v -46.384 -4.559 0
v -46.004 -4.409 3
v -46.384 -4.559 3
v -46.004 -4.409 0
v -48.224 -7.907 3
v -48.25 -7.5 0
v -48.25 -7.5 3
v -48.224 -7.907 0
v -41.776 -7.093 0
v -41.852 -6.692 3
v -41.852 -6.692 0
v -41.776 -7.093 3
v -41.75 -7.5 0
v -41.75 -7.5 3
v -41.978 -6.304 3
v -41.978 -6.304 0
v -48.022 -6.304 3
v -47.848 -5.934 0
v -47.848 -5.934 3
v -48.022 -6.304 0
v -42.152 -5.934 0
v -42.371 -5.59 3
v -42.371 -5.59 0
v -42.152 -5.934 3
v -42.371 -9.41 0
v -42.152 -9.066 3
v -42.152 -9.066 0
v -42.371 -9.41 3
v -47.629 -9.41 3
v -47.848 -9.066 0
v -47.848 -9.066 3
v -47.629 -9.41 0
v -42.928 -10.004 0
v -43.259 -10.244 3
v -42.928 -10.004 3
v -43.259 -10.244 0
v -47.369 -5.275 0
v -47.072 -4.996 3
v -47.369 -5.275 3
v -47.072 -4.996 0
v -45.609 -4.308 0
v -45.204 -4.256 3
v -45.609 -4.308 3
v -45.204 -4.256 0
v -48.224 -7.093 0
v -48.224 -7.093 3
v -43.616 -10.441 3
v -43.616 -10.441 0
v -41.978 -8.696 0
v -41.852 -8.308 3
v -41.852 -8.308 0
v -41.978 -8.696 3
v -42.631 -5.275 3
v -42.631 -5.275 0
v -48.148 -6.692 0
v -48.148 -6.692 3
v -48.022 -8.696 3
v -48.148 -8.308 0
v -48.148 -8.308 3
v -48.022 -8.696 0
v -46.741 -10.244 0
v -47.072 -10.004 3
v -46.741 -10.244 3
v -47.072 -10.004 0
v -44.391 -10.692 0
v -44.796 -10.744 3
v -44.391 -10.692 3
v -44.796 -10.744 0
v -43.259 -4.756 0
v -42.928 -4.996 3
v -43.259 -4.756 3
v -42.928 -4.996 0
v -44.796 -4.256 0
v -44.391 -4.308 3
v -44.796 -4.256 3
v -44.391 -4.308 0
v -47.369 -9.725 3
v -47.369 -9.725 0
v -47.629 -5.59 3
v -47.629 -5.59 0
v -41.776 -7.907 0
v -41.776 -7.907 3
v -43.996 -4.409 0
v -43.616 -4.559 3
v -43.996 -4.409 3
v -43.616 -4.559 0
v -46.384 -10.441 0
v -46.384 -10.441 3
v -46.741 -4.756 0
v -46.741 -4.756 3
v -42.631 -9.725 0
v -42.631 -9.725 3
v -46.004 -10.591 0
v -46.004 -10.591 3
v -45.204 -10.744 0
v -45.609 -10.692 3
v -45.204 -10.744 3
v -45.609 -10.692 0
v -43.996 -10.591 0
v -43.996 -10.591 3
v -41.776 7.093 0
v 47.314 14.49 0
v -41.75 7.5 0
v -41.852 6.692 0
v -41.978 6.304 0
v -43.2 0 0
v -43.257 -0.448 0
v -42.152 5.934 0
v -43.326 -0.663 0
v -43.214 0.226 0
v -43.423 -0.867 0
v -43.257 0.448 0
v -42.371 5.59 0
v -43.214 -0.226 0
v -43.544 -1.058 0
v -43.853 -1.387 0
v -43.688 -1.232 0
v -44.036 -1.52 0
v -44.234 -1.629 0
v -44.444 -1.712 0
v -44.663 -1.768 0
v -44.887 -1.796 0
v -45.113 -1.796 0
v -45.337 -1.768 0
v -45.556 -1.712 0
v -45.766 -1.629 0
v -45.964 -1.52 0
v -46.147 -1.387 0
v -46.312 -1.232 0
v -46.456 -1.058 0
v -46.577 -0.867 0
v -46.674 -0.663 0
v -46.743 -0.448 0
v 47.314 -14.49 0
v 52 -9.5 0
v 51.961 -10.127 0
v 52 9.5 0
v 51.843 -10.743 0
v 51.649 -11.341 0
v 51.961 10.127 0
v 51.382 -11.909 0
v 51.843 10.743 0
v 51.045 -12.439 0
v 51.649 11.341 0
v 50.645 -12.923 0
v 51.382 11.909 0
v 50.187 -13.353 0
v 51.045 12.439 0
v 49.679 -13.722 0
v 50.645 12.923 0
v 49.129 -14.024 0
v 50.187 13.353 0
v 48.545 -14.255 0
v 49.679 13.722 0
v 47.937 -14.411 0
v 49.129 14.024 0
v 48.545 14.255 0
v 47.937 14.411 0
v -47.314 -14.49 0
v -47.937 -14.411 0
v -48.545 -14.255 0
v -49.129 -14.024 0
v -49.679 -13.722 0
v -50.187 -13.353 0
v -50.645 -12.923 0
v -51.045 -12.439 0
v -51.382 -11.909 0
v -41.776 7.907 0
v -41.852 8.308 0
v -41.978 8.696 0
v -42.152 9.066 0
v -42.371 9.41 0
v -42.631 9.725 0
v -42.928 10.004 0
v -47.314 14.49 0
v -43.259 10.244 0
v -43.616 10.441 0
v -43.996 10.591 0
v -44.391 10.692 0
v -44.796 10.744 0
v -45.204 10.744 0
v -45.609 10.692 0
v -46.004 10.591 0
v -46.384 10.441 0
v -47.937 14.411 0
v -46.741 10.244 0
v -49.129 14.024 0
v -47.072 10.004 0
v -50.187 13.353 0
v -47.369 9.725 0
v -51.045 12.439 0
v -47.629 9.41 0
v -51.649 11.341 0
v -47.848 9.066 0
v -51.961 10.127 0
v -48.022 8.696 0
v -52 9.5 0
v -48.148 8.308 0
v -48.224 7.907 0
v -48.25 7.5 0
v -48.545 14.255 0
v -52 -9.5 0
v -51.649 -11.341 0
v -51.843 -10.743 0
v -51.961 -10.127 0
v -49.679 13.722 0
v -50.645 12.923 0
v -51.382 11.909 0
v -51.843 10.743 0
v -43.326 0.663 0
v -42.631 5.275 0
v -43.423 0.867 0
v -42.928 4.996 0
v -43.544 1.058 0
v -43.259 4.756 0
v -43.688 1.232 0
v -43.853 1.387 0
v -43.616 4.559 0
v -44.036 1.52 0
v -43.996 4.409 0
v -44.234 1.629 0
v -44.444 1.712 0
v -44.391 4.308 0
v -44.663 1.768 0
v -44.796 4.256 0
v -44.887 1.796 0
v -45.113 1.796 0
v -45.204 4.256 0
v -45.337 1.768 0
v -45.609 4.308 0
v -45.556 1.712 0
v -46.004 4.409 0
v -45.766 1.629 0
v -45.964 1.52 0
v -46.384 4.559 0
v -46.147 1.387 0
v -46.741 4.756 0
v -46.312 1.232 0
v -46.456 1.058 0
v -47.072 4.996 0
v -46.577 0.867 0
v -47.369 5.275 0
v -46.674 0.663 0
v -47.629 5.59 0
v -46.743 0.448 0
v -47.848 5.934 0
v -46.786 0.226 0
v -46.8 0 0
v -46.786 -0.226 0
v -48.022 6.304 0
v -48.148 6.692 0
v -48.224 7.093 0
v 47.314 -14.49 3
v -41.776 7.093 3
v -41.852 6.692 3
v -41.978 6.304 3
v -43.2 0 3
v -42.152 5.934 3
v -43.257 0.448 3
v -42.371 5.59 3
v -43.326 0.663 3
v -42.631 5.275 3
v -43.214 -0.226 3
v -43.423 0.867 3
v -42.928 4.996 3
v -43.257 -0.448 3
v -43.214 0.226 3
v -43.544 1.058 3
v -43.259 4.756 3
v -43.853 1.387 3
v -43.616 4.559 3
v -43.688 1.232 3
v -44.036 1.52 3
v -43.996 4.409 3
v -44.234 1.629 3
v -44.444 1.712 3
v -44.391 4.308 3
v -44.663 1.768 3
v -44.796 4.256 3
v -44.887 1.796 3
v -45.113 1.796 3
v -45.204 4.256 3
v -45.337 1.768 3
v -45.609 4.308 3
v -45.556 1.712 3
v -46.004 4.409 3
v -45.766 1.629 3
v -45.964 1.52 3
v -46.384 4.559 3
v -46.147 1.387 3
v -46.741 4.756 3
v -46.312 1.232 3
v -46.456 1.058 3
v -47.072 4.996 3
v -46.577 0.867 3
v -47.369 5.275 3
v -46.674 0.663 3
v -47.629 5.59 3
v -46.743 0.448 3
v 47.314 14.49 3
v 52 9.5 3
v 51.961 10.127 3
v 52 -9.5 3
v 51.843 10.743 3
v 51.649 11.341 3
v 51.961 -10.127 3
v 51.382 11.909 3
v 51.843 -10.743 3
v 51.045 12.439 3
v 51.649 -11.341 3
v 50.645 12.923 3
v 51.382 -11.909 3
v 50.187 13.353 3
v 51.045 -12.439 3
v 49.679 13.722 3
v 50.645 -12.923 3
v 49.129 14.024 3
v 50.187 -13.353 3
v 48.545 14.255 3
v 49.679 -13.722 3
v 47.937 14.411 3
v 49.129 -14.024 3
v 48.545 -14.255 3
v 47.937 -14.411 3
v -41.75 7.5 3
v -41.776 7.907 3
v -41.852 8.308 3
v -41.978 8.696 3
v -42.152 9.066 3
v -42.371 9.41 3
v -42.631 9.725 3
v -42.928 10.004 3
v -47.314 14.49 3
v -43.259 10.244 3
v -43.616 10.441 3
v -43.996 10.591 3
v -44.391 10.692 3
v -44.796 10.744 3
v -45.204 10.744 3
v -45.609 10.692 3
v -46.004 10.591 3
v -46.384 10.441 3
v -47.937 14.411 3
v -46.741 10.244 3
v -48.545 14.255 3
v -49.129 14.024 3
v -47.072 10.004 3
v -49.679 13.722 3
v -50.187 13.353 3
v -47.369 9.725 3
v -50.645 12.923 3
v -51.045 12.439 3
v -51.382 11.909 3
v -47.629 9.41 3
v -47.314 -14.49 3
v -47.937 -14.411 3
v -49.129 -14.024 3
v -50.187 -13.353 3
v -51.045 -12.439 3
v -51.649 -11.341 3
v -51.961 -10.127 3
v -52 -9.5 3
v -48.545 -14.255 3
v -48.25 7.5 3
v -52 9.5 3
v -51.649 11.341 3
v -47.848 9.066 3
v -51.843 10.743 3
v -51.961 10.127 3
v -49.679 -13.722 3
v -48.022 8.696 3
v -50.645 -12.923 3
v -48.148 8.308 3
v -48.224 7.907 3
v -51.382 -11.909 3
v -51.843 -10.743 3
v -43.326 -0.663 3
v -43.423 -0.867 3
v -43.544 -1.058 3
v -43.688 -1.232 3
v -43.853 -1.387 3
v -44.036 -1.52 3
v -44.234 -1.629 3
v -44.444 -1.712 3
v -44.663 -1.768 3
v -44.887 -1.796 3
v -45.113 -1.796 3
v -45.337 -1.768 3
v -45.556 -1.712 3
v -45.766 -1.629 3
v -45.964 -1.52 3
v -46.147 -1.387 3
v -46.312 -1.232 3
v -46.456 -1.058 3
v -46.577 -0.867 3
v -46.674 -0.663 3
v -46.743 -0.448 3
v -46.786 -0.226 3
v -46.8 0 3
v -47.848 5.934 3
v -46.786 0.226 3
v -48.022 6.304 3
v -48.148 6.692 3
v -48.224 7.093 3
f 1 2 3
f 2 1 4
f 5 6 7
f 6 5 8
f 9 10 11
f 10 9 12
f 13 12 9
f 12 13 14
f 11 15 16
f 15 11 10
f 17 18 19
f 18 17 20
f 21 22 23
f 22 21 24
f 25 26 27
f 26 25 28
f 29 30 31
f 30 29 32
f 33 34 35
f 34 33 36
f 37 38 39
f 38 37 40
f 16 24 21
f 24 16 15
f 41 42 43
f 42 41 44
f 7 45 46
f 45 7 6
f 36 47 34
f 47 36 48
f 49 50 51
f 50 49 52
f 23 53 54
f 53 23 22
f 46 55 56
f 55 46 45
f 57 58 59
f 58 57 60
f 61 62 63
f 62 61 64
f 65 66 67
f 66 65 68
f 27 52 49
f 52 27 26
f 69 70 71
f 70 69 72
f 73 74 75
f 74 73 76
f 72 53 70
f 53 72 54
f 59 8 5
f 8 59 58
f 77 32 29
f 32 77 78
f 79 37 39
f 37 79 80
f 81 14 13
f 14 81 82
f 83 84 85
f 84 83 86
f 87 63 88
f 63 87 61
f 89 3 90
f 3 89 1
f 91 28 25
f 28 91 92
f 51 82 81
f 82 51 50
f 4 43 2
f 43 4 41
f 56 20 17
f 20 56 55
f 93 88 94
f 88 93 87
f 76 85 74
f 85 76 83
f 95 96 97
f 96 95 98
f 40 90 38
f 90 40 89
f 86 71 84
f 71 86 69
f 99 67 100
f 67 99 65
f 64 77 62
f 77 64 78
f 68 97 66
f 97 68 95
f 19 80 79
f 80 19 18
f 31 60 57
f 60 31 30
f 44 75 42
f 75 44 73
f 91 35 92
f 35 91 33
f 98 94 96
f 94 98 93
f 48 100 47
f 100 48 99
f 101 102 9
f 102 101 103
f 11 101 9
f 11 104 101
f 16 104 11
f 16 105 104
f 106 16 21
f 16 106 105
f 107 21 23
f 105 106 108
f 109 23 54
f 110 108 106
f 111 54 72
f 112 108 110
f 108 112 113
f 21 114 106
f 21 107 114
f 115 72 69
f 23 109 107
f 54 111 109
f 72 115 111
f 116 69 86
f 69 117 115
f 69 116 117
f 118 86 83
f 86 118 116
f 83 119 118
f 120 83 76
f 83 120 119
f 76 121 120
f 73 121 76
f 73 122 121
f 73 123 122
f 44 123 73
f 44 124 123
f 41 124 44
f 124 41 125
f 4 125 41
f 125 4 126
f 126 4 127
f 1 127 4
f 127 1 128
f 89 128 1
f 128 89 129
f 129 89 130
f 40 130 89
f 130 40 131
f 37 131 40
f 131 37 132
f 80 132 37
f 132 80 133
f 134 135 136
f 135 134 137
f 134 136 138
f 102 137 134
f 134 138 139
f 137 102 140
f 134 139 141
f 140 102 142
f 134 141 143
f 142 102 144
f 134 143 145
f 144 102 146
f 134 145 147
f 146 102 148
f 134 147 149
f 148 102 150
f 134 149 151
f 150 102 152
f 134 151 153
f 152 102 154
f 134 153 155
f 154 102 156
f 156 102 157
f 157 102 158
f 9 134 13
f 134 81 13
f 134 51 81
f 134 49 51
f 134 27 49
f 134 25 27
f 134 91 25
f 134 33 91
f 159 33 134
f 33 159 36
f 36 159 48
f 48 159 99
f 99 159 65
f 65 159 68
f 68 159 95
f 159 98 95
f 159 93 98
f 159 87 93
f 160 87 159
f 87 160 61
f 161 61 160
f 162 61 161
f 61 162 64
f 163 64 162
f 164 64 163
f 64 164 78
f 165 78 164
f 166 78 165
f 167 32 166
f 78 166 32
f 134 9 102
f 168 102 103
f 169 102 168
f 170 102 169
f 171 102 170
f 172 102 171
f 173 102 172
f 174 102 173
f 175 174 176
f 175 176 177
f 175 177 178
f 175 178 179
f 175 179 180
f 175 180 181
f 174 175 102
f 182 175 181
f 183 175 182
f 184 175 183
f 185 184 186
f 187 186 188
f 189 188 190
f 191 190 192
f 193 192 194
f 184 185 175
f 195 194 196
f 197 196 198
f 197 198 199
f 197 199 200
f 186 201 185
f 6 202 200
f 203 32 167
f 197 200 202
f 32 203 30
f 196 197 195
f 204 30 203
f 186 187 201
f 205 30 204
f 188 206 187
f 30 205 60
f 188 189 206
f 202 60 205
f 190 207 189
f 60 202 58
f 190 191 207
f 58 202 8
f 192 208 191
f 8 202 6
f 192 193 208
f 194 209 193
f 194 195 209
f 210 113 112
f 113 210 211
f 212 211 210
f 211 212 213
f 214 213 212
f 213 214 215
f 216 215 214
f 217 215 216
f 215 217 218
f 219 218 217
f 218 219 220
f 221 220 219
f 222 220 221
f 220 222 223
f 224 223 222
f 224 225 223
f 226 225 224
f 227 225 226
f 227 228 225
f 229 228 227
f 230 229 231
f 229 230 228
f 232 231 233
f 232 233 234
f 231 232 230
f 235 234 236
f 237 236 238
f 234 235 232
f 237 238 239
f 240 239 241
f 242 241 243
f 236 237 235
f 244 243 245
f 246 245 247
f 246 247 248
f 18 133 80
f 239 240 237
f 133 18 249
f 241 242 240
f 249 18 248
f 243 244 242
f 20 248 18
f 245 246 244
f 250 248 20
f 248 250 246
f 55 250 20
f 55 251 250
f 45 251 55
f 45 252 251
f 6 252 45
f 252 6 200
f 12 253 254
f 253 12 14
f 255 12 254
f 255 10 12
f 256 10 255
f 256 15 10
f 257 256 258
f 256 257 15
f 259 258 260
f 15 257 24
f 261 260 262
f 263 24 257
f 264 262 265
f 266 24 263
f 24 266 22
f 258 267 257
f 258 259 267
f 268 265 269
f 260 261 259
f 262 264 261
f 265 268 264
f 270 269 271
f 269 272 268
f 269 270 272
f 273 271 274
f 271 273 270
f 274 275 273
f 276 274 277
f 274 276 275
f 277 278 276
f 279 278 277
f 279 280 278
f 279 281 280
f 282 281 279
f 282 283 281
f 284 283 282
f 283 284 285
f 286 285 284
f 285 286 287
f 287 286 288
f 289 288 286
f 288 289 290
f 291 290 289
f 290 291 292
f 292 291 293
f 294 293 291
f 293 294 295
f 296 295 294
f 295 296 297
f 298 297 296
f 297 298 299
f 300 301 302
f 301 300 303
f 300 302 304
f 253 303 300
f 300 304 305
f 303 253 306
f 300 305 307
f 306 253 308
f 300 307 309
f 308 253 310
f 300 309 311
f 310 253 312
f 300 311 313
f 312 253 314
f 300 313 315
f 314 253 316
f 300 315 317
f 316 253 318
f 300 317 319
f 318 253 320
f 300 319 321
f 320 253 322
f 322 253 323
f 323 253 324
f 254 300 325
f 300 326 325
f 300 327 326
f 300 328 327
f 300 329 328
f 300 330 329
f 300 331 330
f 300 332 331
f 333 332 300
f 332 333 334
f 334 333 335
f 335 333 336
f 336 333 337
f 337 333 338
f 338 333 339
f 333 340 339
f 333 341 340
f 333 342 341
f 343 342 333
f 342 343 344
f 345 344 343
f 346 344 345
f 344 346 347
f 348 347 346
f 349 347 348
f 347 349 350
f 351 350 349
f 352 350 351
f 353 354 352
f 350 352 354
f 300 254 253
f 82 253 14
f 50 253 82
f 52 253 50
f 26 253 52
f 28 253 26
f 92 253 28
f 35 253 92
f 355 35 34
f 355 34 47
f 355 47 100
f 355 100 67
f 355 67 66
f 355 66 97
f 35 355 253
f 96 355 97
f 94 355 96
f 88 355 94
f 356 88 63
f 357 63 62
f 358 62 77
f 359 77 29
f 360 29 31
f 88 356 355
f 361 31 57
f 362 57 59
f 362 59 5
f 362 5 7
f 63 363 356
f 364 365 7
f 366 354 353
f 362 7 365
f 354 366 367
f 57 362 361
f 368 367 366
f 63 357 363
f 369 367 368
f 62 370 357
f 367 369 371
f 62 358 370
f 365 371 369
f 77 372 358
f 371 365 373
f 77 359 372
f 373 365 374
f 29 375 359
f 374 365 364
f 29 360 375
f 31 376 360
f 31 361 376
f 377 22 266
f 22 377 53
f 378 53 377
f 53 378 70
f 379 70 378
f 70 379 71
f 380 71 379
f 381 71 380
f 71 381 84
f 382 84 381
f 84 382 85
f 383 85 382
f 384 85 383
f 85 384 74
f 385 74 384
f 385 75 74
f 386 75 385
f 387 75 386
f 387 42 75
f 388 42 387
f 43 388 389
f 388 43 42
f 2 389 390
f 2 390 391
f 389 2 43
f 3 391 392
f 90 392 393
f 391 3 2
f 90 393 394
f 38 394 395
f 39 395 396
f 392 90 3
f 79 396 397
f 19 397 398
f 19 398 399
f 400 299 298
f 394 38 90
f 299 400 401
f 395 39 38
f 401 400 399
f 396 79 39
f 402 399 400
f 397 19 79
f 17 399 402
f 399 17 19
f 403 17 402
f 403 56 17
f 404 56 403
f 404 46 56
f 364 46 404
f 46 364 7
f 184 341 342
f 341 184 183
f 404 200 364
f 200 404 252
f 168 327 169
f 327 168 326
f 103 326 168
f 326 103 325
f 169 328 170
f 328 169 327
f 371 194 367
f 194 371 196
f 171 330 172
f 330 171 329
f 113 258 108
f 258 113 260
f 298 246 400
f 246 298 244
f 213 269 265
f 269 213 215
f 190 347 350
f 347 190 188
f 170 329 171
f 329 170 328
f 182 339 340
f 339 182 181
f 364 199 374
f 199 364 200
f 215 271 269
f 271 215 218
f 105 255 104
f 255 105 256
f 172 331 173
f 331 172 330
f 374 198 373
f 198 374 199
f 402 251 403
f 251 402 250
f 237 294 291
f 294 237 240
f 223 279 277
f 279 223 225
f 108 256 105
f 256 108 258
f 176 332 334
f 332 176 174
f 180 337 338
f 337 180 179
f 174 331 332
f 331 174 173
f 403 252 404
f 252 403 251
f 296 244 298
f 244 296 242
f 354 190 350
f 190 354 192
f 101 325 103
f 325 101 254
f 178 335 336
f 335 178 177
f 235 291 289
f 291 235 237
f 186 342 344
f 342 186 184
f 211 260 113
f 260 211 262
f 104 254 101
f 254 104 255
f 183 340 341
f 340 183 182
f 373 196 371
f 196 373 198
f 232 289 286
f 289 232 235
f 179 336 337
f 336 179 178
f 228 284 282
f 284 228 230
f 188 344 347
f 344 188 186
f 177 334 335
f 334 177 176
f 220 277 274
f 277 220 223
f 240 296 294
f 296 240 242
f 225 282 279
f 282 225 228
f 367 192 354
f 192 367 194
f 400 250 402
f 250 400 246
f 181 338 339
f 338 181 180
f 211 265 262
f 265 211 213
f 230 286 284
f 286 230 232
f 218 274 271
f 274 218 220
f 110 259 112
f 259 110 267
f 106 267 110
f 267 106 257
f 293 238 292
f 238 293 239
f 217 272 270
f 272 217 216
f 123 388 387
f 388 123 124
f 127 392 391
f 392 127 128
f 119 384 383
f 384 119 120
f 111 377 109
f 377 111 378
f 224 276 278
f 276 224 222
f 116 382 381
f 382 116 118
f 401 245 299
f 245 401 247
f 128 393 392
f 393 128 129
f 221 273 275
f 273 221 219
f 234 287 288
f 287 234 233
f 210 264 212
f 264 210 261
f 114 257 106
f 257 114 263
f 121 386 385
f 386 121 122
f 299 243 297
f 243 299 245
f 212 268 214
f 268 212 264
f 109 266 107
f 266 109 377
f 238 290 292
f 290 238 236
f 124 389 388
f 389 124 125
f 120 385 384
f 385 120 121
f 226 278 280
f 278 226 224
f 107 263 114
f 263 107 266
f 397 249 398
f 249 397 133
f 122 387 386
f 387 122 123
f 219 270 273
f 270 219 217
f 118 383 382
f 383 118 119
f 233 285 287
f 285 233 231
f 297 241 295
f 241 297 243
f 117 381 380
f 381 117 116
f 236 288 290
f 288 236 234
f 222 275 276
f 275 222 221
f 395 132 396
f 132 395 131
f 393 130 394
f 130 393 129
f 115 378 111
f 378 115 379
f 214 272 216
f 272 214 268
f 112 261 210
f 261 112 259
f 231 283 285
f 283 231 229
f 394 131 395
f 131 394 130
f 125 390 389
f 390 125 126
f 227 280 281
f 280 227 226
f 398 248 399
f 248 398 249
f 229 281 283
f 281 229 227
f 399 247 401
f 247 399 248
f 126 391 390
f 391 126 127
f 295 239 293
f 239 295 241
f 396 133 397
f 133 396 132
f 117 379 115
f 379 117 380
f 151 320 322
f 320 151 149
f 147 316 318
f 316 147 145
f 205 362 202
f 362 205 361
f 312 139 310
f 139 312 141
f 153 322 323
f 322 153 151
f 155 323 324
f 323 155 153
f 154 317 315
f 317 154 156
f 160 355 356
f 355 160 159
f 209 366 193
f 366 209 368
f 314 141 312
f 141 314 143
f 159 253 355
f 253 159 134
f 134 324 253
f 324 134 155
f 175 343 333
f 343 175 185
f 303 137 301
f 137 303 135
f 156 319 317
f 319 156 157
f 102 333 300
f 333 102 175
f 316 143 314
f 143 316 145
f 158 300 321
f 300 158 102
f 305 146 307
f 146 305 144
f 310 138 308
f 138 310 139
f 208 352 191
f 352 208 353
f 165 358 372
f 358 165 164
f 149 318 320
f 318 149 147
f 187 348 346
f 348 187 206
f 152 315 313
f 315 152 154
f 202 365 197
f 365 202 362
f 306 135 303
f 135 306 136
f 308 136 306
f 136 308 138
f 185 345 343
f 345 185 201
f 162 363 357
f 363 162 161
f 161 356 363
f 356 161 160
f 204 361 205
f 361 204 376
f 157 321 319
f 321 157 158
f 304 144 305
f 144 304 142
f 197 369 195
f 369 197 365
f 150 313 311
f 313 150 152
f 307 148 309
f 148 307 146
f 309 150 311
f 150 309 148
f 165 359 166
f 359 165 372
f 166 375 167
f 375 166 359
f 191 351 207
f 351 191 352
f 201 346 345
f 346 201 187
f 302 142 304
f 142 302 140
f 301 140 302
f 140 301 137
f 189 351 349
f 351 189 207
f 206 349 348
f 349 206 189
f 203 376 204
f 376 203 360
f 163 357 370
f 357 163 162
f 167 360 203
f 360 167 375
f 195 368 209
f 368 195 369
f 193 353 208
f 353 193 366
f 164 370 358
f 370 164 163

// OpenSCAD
$fn = 50;


difference() {
	union() {
		hull() {
			translate(v = [-47.0000000000, 9.5000000000, 0]) {
				cylinder(h = 3, r = 5);
			}
			translate(v = [47.0000000000, 9.5000000000, 0]) {
				cylinder(h = 3, r = 5);
			}
			translate(v = [-47.0000000000, -9.5000000000, 0]) {
				cylinder(h = 3, r = 5);
			}
			translate(v = [47.0000000000, -9.5000000000, 0]) {
				cylinder(h = 3, r = 5);
			}
		}
	}
	union() {
		translate(v = [-45.0000000000, -7.5000000000, 0]) {
			cylinder(h = 3, r = 3.2500000000);
		}
		translate(v = [-45.0000000000, 7.5000000000, 0]) {
			cylinder(h = 3, r = 3.2500000000);
		}
		translate(v = [-45.0000000000, -7.5000000000, 0]) {
			cylinder(h = 3, r = 1.8000000000);
		}
		translate(v = [-45.0000000000, 0.0000000000, 0]) {
			cylinder(h = 3, r = 1.8000000000);
		}
		translate(v = [-45.0000000000, 7.5000000000, 0]) {
			cylinder(h = 3, r = 1.8000000000);
		}
		translate(v = [-45.0000000000, -7.5000000000, 0]) {
			cylinder(h = 3, r = 1.8000000000);
		}
		translate(v = [-45.0000000000, 0.0000000000, 0]) {
			cylinder(h = 3, r = 1.8000000000);
		}
		translate(v = [-45.0000000000, 7.5000000000, 0]) {
			cylinder(h = 3, r = 1.8000000000);
		}
		translate(v = [-45.0000000000, -7.5000000000, 0]) {
			cylinder(h = 3, r = 1.8000000000);
		}
		translate(v = [-45.0000000000, 0.0000000000, 0]) {
			cylinder(h = 3, r = 1.8000000000);
		}
		translate(v = [-45.0000000000, 7.5000000000, 0]) {
			cylinder(h = 3, r = 1.8000000000);
		}
	}
}
